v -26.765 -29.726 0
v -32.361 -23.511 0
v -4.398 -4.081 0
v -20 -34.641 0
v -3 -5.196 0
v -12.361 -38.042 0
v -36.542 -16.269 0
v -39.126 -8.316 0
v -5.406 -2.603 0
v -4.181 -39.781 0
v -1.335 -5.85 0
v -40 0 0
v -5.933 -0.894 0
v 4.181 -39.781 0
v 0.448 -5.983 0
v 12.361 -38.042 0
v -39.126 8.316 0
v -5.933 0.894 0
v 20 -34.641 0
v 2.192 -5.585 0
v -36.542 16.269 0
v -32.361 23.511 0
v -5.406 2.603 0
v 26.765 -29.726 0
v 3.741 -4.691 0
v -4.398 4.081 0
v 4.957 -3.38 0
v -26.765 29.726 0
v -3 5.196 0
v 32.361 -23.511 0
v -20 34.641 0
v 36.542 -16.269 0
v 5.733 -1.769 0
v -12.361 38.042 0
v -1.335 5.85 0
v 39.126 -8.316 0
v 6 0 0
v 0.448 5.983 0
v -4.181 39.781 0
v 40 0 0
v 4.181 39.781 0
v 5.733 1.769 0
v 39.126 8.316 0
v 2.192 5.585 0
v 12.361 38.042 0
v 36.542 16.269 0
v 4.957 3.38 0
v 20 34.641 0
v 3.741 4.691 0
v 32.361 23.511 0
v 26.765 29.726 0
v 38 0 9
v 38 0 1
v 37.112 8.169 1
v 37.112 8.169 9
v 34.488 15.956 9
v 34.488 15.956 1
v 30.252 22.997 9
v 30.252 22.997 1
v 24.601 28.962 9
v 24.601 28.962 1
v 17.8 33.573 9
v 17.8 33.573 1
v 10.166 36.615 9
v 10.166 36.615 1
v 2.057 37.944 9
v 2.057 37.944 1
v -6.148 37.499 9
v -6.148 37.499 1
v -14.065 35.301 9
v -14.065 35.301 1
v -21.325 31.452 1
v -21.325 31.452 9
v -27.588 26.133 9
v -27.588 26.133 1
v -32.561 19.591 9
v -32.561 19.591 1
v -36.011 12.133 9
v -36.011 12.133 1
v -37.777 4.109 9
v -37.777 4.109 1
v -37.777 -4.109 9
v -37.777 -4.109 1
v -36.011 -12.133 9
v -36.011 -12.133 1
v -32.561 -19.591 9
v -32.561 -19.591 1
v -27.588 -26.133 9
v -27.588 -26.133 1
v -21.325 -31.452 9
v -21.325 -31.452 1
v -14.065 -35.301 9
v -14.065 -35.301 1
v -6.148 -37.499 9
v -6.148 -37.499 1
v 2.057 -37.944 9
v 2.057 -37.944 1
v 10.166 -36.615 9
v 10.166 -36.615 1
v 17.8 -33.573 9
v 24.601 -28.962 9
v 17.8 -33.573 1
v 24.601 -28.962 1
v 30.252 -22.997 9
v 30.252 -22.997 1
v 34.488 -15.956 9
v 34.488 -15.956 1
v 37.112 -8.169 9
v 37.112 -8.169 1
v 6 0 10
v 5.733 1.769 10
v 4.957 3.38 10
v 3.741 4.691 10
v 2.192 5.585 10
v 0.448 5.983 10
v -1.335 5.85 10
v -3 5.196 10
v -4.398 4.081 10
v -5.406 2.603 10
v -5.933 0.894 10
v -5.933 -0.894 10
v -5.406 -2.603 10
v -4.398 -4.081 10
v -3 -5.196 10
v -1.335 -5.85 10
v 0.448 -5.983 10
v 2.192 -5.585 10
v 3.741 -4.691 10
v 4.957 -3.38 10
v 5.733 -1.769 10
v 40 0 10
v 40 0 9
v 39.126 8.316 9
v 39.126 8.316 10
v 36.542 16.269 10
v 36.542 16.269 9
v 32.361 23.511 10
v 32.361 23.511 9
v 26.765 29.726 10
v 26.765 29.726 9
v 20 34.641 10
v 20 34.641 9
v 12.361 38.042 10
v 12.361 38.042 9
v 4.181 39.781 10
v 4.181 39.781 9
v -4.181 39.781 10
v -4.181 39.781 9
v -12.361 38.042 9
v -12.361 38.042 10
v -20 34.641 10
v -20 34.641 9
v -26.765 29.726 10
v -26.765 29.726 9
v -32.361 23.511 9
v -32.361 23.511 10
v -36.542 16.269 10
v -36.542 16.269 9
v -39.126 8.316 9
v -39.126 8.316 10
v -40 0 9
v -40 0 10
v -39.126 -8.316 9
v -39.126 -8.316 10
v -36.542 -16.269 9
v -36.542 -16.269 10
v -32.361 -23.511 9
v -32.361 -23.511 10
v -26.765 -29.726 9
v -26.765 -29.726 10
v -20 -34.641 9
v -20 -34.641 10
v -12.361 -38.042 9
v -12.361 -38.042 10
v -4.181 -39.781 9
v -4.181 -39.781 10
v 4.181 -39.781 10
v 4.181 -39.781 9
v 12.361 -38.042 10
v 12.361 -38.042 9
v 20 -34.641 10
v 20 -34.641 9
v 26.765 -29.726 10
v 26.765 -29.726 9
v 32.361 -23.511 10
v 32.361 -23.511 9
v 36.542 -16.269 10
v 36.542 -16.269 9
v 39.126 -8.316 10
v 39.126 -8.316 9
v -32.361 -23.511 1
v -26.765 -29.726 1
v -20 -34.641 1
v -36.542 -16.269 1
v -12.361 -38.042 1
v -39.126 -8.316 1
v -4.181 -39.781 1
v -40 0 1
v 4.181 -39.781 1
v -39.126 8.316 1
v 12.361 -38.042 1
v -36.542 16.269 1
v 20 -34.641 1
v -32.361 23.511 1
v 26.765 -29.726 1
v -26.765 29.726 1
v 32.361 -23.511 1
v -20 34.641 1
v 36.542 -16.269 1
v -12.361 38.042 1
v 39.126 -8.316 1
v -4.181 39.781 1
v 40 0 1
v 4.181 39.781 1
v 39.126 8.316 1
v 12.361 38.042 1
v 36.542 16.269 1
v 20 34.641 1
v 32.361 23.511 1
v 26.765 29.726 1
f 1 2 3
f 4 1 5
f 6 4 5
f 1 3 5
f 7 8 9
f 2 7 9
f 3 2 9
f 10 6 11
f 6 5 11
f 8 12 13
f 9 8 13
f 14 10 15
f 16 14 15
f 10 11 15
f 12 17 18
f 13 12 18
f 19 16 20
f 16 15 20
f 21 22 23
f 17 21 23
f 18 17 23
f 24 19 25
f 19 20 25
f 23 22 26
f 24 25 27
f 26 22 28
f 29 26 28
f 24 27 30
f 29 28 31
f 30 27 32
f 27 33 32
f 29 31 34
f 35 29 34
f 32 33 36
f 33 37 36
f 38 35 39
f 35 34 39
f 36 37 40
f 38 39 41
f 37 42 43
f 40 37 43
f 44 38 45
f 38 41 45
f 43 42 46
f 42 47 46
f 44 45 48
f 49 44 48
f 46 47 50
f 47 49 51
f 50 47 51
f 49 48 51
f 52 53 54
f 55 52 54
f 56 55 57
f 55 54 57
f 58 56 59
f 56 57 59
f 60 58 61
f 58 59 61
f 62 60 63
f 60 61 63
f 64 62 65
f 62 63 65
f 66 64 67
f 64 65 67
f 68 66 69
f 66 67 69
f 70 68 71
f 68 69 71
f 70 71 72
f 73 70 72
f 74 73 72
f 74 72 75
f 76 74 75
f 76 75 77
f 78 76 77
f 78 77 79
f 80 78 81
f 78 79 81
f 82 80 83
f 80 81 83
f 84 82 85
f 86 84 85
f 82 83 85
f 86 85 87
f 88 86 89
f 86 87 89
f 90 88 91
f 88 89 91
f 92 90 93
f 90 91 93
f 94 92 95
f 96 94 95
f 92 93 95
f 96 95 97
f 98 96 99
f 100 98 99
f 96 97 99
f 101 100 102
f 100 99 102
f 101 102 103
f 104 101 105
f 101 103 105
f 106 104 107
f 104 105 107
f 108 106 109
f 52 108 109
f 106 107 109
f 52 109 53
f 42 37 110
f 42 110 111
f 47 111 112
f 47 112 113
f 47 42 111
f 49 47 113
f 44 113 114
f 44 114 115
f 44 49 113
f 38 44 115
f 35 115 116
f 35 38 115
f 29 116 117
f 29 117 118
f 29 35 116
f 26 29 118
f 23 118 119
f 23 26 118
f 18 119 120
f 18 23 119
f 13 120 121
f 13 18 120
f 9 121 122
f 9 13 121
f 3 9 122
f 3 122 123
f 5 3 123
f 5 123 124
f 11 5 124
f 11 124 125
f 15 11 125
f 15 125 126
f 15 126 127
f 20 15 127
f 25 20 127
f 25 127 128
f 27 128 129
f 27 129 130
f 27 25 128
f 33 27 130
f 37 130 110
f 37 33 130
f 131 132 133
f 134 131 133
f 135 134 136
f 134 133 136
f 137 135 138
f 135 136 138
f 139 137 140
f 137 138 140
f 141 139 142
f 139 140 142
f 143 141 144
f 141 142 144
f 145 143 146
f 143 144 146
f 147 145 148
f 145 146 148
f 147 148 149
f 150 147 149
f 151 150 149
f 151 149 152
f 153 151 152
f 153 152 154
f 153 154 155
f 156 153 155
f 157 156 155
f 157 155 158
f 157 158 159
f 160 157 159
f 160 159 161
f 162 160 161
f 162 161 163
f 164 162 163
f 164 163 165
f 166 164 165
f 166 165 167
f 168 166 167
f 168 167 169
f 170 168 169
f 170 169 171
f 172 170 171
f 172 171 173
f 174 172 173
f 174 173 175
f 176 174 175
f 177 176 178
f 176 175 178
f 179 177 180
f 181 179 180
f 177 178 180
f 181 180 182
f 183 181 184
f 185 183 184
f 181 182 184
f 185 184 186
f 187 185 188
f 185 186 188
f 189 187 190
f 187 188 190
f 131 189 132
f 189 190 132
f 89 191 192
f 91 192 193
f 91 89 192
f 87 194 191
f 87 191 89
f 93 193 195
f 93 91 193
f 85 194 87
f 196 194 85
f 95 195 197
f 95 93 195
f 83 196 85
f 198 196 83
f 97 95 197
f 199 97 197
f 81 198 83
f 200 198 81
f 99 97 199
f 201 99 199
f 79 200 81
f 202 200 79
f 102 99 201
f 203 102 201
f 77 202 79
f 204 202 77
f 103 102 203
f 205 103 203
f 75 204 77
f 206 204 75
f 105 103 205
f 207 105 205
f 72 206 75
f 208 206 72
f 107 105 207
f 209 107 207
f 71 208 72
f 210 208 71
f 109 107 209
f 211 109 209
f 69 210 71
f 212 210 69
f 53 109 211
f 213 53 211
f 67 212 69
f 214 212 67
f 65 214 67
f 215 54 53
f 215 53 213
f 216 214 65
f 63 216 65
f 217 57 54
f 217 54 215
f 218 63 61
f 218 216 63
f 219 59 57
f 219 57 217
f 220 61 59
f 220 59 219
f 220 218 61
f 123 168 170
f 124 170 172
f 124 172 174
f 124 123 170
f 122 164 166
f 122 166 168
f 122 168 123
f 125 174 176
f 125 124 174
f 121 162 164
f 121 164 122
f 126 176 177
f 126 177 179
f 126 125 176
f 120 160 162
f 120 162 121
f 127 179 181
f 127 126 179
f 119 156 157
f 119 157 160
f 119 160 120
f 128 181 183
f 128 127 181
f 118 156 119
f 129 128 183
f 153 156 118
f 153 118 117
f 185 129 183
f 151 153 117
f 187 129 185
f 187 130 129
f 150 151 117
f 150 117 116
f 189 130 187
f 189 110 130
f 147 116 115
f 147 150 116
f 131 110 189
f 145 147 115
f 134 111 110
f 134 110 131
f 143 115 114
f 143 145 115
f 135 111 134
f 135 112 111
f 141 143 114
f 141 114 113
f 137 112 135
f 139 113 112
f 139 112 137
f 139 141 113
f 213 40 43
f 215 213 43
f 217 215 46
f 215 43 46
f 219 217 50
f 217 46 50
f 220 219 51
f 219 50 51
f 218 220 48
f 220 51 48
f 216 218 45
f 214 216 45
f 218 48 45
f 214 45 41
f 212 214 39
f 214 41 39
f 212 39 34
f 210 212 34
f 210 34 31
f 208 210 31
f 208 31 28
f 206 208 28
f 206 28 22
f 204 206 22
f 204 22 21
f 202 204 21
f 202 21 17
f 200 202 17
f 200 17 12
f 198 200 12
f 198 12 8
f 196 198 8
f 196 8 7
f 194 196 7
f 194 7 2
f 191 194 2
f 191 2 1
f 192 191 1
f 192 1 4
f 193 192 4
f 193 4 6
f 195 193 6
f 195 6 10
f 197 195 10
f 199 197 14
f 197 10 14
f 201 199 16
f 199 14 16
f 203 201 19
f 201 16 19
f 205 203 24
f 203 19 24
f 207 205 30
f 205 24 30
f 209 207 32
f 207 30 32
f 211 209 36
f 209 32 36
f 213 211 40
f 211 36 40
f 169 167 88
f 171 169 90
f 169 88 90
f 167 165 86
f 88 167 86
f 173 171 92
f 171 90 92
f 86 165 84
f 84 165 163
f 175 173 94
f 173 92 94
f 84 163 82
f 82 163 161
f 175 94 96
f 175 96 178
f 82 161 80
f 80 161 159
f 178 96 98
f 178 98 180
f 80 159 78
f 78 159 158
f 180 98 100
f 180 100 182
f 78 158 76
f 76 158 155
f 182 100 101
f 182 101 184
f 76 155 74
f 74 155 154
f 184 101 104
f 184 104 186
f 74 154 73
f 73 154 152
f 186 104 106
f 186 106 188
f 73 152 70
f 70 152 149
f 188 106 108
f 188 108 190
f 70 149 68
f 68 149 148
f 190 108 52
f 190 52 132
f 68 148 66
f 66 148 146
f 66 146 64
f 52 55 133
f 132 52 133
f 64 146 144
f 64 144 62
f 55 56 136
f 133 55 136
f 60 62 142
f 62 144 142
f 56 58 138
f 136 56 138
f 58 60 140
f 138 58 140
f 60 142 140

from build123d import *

# Parameters (mm, degrees)
SKETCH1_R           = 40
SKETCH1_R_2         = 6
BOSS_EXTRUDE1_DEPTH = 10
CUT_EXTRUDE1_START  = 1
SKETCH1_3_R         = 40
SKETCH1_3_R_2       = 38
CUT_EXTRUDE1_DEPTH  = 8


with BuildPart() as part:
    # Sketch1 → Boss-Extrude1 (new body)
    with BuildSketch(Plane.XY):
        Circle(SKETCH1_R)
        Circle(SKETCH1_R_2, mode=Mode.SUBTRACT)
    extrude(amount=BOSS_EXTRUDE1_DEPTH)

    # Sketch1<3> → Cut-Extrude1 (cut)
    with BuildSketch(Plane.XY.offset(CUT_EXTRUDE1_START)):
        Circle(SKETCH1_3_R)
        Circle(SKETCH1_3_R_2, mode=Mode.SUBTRACT)
    extrude(amount=CUT_EXTRUDE1_DEPTH, mode=Mode.SUBTRACT)


solid = part.part
